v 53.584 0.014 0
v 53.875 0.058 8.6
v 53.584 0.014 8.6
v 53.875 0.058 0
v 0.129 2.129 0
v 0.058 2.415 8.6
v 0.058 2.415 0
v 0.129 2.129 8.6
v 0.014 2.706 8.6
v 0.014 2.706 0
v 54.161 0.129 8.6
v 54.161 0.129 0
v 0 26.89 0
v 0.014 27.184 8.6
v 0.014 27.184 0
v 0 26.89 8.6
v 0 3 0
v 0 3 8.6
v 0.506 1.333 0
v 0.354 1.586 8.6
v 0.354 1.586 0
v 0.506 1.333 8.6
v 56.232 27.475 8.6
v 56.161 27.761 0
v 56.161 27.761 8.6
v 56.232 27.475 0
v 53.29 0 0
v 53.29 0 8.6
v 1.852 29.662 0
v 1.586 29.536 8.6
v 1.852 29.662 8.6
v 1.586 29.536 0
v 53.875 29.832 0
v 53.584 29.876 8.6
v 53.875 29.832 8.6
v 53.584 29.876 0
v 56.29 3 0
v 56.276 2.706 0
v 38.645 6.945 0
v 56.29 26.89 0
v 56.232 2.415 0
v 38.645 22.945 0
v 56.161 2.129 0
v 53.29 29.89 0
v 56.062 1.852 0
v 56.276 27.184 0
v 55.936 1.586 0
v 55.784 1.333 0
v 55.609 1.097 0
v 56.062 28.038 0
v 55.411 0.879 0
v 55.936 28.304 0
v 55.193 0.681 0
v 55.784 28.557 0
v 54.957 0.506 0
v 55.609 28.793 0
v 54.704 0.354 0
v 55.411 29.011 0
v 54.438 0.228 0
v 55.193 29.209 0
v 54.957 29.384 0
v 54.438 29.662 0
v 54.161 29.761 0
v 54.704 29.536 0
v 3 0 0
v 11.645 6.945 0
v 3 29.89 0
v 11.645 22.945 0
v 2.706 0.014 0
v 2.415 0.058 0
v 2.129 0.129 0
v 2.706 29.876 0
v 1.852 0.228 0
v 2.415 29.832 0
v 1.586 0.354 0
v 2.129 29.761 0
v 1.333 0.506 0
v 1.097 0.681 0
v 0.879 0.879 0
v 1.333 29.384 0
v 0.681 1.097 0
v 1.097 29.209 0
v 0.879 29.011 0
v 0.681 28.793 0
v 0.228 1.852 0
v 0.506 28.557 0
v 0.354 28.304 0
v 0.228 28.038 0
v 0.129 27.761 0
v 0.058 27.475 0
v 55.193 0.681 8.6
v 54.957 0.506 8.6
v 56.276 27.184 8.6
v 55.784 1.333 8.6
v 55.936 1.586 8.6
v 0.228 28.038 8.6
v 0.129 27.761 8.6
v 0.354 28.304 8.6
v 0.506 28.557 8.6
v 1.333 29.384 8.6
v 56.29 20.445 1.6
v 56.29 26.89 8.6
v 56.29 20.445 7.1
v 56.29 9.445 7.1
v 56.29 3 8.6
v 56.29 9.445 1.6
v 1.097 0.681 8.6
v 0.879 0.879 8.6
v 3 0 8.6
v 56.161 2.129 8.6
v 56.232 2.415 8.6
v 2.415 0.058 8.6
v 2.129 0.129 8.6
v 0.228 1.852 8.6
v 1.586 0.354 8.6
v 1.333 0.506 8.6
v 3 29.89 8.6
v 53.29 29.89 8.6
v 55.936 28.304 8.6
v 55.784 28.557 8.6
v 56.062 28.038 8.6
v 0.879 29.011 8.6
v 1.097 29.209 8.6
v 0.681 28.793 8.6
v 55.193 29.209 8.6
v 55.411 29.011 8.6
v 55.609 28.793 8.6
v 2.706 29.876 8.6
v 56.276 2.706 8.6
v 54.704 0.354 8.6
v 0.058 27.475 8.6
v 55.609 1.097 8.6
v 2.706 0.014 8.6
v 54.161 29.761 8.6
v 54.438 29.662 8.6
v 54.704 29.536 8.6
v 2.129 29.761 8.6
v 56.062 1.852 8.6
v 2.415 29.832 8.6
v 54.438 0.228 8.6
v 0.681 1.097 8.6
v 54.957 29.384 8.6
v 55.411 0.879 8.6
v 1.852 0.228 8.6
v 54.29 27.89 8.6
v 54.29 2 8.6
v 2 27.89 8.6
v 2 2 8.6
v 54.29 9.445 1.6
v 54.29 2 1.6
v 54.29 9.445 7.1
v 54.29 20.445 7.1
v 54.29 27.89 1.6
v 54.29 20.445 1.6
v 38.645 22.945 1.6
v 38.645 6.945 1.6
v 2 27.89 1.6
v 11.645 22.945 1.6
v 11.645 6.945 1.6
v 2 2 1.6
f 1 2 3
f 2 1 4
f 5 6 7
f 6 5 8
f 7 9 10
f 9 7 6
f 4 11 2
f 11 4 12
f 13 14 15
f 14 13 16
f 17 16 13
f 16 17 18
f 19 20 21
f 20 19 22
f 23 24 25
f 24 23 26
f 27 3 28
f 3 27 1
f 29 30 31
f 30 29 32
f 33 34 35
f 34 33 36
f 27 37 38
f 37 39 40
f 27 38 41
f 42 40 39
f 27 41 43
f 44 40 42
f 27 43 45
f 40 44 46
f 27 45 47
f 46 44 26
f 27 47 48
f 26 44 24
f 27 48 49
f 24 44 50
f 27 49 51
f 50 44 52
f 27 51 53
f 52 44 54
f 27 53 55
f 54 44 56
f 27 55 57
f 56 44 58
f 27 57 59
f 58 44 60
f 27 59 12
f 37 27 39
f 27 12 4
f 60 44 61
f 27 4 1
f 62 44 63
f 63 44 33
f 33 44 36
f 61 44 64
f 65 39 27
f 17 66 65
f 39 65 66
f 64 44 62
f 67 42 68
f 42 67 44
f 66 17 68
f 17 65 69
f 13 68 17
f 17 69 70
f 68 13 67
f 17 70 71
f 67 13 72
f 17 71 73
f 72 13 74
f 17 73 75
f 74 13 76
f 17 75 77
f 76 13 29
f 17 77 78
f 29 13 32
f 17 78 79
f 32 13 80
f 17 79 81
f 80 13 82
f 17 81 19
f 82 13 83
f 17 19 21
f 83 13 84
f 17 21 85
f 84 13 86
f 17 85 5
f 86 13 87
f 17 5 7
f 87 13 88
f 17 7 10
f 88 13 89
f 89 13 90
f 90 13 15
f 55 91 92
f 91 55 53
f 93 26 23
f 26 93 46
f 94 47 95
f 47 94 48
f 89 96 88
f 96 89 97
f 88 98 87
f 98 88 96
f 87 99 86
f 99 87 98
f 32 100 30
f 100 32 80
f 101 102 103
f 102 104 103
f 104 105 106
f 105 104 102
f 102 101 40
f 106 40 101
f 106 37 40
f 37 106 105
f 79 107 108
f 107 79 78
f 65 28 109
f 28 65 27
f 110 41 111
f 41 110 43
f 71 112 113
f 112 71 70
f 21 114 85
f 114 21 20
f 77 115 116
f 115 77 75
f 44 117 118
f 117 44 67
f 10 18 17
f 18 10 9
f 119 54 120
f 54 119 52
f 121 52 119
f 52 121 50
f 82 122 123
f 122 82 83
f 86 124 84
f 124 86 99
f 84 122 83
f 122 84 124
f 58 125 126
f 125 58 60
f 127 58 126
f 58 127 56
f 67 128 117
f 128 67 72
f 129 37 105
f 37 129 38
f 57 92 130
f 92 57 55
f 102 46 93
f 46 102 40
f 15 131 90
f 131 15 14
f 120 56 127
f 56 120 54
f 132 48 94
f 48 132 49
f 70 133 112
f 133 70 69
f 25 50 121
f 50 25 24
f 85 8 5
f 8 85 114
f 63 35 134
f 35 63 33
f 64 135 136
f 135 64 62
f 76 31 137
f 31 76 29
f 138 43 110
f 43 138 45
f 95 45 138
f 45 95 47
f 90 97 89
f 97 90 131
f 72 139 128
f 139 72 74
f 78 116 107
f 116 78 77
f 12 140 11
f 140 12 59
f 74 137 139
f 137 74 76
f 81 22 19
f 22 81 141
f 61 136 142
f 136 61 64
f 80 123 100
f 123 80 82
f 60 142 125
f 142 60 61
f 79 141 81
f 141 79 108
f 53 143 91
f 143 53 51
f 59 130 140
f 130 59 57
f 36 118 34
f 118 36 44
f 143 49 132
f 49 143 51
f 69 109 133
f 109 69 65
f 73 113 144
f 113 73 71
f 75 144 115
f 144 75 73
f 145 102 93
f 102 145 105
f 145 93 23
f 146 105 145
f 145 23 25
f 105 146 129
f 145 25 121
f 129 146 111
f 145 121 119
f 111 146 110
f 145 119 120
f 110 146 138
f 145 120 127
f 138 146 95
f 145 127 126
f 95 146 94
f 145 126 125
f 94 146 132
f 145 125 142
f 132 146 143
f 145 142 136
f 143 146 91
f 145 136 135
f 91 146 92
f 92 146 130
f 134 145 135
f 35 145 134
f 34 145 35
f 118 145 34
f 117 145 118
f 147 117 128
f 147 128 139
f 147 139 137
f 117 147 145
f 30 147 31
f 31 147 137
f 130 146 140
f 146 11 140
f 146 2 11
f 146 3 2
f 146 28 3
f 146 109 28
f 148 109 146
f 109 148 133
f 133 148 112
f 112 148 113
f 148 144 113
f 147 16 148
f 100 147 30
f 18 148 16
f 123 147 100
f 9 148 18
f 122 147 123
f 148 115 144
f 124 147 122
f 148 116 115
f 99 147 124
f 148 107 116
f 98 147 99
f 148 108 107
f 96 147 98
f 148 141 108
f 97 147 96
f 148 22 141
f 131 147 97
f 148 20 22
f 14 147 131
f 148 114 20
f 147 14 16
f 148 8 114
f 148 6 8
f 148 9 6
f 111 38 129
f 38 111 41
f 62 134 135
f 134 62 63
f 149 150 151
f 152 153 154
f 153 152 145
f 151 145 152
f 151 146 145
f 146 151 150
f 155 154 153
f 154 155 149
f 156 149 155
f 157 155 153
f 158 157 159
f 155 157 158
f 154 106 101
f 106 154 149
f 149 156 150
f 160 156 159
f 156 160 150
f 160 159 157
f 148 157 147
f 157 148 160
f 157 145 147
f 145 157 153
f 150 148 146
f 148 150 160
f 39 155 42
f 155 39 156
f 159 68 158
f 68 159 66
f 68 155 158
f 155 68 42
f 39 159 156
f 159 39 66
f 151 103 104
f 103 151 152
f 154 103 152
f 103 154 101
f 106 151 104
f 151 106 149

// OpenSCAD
// ============================================================================
//  T-Display enclosed case  —  PART 1: front bezel tray  (also the TEST-FIT piece)
//
//  Holds the bare LilyGO T-Display (51.49 x 25.09 mm). The board drops in from
//  the back, screen facing out through the window; USB-C exits one short end.
//  This is the fit-critical part — print THIS first, verify, then we add the
//  tilted enclosed back.
//
//  Print bezel-face DOWN on the bed → clean screen-side, no supports.
//  Units: mm.  Numbers marked (TUNE) are first estimates to confirm on the test print.
// ============================================================================

/* ---------- board (confirmed) ---------- */
board_len    = 51.49;   // long edge (X)
board_w      = 25.09;   // short edge (Y)

/* ---------- fit (TUNE on the test print) ---------- */
cavity_depth = 7.0;     // (TUNE) bezel back-face to the rear opening: PCB + back parts + room
clear        = 0.4;     // per-side gap around the board (drop-in fit)

/* ---------- shell ---------- */
wall    = 2.0;          // side wall thickness
bezel_t = 1.6;          // front bezel thickness (frames the screen)
corner_r= 3;            // outer rounded corners

/* ---------- screen window (TUNE position on the test print) ---------- */
win_x   = 27;           // window along board LENGTH (active ~25.6 + margin)
win_y   = 16;           // window along board WIDTH  (active ~14.5 + margin)
win_off = -3;           // window centre offset along length, toward the far-from-USB end

/* ---------- USB-C cutout (on the +X short end) ---------- */
usb_w   = 11;           // opening width  (USB-C ~9 + clearance)
usb_z   = 5.5;          // opening height (through the board-thickness direction)

/* ---------- preview only ---------- */
show_board = false;     // render with: openscad -D show_board=true ...

$fn = 64;

cav_x = board_len + 2*clear;
cav_y = board_w   + 2*clear;
out_x = cav_x + 2*wall;
out_y = cav_y + 2*wall;
out_z = bezel_t + cavity_depth;

module rrect(w, d, r) {
    hull() {
        translate([r,     r    ]) circle(r);
        translate([w - r, r    ]) circle(r);
        translate([r,     d - r]) circle(r);
        translate([w - r, d - r]) circle(r);
    }
}

module front_tray() {
    difference() {
        // outer shell
        linear_extrude(out_z) rrect(out_x, out_y, corner_r);

        // board cavity (open at the back, +Z)
        translate([wall, wall, bezel_t]) cube([cav_x, cav_y, cavity_depth + 1]);

        // screen window through the bezel
        translate([out_x/2 + win_off - win_x/2, out_y/2 - win_y/2, -1])
            cube([win_x, win_y, bezel_t + 2]);

        // USB-C cutout in the +X end wall
        translate([out_x - wall - 1, out_y/2 - usb_w/2, bezel_t])
            cube([wall + 2, usb_w, usb_z]);
    }
}

module board_ghost() {
    translate([wall + clear, wall + clear, bezel_t]) {
        color([0.12, 0.12, 0.13]) cube([board_len, board_w, 1.6]);        // PCB
        // lit screen, drawn under the window opening (preview coherence)
        color([0.72, 0.47, 0.34])
            translate([out_x/2 + win_off - (wall + clear) - 25.6/2,
                       out_y/2 - (wall + clear) - 14.5/2, -bezel_t - 0.2])
                cube([25.6, 14.5, bezel_t]);
    }
}

front_tray();
if (show_board) board_ghost();
